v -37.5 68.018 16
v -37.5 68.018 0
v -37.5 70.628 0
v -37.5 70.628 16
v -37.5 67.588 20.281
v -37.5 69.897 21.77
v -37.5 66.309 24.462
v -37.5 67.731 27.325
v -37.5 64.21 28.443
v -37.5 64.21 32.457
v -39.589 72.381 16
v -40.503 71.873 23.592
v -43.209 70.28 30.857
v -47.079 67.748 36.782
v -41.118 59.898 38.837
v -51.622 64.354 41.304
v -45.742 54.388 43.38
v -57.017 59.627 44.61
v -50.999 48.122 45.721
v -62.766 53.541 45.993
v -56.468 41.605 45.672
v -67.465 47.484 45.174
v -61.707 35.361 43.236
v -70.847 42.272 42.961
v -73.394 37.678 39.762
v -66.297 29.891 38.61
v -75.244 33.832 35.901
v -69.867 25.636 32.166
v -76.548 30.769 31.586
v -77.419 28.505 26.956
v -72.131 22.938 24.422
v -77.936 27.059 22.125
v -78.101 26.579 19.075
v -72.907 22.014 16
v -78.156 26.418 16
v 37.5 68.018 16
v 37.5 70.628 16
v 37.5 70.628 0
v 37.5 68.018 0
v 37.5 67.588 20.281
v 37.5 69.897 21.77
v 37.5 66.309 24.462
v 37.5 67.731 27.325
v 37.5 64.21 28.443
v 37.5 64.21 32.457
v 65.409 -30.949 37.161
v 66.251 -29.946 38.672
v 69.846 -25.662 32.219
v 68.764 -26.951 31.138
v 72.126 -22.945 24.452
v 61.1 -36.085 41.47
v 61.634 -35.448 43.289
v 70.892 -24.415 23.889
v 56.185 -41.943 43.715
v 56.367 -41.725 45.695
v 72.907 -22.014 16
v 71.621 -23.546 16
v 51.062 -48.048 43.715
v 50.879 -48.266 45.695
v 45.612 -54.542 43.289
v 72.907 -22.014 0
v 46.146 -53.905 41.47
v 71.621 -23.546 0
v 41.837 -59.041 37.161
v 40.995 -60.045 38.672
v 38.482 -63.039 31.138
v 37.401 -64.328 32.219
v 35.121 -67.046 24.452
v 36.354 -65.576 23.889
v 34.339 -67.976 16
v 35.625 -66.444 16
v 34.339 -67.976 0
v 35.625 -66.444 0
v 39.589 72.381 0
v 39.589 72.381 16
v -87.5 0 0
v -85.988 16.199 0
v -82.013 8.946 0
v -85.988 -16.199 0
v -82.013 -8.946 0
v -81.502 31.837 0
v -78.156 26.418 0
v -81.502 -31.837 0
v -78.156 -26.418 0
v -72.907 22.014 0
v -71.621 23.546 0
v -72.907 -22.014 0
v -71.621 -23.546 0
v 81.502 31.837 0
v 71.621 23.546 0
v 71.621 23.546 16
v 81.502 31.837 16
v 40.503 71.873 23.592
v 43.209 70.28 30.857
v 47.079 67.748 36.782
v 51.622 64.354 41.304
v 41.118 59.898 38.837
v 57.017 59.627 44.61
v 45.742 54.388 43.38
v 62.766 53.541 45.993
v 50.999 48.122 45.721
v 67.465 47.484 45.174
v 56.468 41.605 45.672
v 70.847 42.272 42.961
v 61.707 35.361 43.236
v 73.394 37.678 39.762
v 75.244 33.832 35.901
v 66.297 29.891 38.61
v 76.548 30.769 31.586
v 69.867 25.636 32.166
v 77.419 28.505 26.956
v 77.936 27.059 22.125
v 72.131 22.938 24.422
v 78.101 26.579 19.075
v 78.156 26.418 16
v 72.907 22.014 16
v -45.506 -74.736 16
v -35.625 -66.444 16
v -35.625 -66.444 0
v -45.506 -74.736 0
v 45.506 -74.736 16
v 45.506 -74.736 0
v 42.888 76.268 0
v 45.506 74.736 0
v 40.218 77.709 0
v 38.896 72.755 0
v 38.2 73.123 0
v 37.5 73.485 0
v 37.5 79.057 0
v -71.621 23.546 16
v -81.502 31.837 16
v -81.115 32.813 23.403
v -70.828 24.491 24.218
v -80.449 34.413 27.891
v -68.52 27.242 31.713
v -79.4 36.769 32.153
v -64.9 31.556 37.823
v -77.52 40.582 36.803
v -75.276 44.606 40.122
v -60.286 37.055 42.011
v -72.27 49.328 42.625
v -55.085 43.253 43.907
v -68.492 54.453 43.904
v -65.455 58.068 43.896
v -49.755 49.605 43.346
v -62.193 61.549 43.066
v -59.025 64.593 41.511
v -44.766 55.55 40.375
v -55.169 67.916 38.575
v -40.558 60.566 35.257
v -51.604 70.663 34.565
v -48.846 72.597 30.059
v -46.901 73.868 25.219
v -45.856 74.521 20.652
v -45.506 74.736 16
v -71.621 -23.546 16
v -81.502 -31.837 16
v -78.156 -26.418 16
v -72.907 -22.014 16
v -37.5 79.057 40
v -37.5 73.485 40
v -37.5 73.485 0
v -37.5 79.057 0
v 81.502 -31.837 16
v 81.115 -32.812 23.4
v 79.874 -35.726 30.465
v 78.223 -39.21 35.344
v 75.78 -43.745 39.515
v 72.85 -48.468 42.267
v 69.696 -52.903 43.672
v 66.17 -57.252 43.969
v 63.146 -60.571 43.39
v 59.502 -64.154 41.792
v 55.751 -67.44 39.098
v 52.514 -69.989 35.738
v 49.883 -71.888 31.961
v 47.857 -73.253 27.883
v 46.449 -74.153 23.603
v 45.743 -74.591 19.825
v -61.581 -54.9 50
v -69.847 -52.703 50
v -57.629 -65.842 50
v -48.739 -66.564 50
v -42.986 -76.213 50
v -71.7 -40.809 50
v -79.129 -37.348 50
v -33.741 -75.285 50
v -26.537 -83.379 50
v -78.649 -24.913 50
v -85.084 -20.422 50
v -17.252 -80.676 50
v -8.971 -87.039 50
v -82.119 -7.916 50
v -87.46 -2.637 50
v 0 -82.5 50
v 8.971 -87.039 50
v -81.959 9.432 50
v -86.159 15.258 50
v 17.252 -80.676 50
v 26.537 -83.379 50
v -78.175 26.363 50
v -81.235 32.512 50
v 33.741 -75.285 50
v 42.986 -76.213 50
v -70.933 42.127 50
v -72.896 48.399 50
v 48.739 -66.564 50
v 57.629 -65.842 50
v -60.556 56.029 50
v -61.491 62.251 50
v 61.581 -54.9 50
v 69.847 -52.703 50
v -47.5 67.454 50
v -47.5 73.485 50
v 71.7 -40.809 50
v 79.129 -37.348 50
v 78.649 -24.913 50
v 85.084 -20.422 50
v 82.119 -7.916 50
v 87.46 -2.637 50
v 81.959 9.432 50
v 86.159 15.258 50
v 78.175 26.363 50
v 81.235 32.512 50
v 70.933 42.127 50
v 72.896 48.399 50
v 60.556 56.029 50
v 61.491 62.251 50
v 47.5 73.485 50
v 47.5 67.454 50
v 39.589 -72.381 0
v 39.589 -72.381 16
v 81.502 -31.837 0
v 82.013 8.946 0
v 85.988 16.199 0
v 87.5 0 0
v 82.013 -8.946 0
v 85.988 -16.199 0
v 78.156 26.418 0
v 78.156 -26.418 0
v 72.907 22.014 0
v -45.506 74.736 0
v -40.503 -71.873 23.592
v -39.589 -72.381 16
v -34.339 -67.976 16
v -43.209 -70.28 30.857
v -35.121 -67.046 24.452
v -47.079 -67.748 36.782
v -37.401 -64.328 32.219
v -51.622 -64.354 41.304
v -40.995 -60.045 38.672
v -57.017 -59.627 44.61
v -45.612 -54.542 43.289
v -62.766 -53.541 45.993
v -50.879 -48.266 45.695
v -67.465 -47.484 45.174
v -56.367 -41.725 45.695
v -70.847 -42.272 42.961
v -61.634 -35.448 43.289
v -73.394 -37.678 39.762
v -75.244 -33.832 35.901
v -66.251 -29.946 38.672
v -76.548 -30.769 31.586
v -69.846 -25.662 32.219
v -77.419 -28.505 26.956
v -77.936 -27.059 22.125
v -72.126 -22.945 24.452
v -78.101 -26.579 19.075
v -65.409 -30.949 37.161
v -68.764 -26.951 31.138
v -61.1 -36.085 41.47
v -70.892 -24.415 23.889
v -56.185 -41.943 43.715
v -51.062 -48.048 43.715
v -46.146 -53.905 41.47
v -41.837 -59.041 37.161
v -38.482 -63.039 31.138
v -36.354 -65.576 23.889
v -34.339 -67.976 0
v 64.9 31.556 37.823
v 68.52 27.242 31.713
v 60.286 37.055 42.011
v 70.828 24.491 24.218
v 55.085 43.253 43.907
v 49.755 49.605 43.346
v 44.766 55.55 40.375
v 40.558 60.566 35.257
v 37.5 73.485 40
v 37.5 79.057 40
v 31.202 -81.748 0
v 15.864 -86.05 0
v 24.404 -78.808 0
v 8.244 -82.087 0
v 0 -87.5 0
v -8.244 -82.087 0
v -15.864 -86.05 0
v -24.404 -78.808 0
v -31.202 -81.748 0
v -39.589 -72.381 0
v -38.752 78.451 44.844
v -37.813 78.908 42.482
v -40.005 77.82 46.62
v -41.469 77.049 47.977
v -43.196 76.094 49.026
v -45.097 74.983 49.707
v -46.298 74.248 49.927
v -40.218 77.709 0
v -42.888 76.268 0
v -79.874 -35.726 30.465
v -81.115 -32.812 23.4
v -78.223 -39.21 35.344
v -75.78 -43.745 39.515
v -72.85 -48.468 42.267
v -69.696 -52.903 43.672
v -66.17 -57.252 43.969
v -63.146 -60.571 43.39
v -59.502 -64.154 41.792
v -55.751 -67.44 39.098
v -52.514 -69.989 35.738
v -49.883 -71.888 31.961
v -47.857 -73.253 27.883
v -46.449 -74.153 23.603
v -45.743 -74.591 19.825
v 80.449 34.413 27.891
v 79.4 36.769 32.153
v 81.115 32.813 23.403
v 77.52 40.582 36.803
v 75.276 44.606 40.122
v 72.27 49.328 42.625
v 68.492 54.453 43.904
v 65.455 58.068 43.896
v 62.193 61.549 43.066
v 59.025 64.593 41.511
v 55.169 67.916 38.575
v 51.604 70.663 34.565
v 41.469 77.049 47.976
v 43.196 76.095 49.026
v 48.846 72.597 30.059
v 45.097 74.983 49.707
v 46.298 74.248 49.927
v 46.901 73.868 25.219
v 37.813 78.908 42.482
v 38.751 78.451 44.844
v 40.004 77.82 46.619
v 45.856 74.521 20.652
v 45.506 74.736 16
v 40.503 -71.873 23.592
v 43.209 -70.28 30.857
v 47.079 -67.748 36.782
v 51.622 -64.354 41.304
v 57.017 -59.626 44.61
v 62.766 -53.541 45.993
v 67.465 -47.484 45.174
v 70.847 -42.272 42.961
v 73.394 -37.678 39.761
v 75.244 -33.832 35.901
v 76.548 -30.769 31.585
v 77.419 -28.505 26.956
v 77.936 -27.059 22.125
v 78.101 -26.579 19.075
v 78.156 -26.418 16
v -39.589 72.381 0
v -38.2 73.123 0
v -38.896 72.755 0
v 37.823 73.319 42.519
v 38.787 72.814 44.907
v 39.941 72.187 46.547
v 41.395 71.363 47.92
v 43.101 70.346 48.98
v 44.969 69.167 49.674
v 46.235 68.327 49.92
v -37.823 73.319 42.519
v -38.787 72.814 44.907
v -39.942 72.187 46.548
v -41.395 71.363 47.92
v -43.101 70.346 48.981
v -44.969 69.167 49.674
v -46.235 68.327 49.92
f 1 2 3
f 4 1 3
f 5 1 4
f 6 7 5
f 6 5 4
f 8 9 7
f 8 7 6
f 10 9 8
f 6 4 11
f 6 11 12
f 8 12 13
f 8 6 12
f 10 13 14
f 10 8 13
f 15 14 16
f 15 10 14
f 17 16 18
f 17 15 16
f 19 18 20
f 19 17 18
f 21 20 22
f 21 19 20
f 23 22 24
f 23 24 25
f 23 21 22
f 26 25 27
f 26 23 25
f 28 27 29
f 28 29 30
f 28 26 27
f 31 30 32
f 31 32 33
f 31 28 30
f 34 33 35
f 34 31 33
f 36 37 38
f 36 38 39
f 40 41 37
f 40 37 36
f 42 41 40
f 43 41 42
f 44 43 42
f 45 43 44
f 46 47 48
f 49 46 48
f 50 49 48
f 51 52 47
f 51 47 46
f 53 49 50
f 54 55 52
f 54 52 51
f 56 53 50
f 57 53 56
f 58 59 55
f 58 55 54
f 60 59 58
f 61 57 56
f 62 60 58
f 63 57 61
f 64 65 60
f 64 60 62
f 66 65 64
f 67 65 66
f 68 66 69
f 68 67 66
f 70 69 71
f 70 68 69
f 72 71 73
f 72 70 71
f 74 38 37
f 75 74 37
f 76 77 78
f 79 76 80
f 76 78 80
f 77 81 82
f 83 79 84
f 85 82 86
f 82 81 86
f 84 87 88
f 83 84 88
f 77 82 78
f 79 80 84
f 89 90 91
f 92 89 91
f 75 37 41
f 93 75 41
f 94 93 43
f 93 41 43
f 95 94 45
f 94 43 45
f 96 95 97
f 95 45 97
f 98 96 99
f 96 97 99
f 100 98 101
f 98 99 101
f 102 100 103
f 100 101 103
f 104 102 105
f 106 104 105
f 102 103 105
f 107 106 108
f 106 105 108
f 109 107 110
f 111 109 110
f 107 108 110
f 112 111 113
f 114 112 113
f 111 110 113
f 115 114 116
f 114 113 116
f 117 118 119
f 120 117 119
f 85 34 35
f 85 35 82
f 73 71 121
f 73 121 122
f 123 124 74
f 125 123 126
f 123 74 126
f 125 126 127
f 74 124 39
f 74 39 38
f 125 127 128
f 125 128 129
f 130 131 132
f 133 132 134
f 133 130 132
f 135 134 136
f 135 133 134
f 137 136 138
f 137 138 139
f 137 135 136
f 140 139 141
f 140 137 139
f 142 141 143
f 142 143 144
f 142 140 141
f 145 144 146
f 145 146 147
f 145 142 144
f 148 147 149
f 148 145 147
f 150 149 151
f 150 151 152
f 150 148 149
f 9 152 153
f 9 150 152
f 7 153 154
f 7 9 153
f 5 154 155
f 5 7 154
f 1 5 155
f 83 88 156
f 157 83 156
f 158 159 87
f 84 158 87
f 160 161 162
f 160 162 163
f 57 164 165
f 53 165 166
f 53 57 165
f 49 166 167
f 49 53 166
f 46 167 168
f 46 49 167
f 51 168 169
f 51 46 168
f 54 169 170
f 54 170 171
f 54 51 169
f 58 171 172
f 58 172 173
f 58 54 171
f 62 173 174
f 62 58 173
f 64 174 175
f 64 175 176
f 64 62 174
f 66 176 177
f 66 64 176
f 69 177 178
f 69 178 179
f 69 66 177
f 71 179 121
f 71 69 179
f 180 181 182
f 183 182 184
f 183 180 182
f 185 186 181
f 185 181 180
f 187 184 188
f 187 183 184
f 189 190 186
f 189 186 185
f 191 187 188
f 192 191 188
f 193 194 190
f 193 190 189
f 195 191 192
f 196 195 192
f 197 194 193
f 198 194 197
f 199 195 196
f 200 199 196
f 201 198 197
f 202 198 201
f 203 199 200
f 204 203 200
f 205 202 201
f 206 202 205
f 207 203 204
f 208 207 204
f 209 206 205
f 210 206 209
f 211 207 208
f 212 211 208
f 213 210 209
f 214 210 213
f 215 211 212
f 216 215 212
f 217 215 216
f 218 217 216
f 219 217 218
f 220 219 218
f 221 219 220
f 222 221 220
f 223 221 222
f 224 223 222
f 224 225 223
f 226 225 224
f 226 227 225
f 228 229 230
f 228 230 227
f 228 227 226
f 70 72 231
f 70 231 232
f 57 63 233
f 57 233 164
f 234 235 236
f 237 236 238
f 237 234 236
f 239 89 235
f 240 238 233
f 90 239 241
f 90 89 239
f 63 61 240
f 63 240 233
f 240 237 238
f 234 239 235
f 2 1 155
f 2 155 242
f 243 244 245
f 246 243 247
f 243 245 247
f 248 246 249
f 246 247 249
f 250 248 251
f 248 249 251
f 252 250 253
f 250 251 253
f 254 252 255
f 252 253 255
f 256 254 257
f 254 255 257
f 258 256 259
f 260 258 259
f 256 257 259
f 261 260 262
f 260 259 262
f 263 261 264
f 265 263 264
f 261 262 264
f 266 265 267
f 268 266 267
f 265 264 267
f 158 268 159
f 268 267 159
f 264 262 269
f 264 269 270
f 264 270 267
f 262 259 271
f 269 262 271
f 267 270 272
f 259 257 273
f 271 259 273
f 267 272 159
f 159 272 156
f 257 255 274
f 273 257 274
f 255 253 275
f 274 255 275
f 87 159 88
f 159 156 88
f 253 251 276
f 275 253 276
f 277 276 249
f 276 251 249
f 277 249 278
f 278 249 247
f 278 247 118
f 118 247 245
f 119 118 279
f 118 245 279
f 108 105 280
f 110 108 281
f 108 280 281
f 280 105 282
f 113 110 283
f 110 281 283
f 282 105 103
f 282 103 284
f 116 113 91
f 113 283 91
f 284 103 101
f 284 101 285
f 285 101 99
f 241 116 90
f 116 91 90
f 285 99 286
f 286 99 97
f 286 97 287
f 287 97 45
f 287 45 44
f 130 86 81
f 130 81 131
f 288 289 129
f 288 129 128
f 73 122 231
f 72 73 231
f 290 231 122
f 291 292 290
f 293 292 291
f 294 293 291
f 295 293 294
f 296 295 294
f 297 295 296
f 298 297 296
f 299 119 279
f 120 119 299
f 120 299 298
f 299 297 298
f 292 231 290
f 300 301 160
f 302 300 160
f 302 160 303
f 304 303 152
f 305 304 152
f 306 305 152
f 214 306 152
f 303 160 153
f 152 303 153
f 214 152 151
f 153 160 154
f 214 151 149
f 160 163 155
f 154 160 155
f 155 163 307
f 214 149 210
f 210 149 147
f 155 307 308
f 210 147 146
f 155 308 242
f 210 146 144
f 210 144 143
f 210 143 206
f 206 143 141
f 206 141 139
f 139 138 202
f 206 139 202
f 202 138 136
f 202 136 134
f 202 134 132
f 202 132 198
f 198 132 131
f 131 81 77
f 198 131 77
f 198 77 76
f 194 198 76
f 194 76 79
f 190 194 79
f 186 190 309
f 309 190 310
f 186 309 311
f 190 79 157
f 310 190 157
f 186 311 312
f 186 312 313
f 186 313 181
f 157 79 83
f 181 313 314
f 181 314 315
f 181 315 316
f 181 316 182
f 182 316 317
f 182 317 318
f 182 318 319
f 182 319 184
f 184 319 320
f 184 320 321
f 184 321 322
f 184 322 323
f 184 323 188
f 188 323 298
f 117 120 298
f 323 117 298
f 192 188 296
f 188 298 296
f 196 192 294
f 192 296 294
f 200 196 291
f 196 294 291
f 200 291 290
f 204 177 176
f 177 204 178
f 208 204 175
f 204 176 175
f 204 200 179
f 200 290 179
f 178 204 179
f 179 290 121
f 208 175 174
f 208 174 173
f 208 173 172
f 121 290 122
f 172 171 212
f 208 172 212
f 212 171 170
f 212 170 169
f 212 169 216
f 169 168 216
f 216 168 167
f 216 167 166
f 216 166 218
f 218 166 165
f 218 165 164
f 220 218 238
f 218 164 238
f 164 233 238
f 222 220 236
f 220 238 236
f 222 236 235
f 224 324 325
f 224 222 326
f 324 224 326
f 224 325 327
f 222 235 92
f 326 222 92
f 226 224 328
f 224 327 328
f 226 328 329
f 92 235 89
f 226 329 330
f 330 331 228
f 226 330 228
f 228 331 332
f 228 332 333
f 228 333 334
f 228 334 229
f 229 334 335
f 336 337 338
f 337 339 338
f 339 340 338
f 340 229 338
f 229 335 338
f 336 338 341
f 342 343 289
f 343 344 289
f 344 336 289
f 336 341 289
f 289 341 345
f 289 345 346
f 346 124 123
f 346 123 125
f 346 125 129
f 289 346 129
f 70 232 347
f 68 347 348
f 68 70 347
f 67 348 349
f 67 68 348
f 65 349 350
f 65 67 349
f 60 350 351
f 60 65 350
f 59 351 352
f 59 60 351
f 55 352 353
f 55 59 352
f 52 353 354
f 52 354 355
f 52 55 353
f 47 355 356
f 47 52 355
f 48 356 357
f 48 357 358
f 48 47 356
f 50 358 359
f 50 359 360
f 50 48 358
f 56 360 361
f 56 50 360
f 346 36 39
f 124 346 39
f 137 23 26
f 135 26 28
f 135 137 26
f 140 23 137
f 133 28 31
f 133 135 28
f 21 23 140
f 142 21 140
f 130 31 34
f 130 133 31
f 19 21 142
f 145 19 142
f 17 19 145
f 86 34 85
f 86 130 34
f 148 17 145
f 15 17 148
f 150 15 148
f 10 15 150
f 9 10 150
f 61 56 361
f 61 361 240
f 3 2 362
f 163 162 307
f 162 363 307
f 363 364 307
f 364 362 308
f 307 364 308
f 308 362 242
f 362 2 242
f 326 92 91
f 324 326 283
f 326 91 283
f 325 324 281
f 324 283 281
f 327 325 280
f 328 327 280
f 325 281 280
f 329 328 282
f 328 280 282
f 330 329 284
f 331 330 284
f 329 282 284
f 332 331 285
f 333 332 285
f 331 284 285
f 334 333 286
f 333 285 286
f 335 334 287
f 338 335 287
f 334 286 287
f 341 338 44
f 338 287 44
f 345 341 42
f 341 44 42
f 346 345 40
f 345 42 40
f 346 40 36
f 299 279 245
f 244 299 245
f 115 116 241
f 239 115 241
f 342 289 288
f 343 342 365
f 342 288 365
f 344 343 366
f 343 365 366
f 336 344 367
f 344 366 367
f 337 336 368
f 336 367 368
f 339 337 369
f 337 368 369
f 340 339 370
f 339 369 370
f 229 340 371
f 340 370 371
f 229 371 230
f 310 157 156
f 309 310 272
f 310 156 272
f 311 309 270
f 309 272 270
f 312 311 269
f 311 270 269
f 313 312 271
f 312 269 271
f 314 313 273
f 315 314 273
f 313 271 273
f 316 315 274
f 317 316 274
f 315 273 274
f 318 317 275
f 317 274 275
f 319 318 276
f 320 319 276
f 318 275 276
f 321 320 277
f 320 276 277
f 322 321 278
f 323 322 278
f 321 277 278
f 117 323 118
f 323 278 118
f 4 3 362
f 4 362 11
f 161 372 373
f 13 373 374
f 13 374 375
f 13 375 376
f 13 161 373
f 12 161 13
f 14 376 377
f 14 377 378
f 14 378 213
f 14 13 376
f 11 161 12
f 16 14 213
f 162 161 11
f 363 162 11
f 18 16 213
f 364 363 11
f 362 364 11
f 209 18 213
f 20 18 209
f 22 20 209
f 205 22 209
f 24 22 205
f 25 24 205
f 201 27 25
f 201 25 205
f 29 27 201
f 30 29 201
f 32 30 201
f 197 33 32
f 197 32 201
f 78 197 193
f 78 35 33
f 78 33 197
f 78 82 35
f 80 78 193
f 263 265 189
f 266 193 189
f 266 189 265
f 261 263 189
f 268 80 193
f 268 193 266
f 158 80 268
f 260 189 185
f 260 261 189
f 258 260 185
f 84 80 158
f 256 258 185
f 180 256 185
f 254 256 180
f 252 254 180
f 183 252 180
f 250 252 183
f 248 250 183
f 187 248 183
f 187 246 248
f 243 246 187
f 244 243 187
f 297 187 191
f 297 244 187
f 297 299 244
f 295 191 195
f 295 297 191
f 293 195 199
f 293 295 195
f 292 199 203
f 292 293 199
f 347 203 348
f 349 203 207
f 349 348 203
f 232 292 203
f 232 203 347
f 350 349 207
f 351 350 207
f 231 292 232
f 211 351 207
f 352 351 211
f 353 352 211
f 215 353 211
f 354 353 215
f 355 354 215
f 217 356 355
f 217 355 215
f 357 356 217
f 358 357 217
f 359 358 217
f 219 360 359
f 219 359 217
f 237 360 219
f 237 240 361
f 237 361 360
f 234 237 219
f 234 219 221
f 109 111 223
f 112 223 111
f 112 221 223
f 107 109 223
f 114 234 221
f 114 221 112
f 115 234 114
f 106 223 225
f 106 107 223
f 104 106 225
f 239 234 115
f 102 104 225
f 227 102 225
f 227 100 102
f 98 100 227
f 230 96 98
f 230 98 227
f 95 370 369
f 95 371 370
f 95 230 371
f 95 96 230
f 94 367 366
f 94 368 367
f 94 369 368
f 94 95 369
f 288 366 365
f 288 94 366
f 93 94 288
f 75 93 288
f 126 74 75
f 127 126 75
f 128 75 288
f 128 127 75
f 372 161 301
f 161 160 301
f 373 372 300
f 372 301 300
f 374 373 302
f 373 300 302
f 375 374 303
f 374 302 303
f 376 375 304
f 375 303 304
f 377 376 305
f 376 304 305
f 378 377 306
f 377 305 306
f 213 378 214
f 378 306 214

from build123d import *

# Parameters (mm, degrees)
SKETCH1_R                                     = 87.5
SKETCH1_R_2                                   = 82.49999999999999
BOSS_EXTRUDE1_DEPTH                           = 50
CUT_EXTRUDE1_DEPTH                            = 134.46347815039138
BOSS_EXTRUDE2_REACH                           = 201.927
BOSS_EXTRUDE2_END_RADIUS                      = 82.49999999999999
MIRROR1_AT_THE_SECOND_PLANE_COPY_1_DEPTH      = 134.46347815039138
MIRROR1_AT_THE_SECOND_PLANE_COPY_2_REACH      = 201.927
MIRROR1_AT_THE_SECOND_PLANE_COPY_2_END_RADIUS = 82.49999999999999
CUT_EXTRUDE2_DEPTH                            = 134.46347831897683
FILLET1_R                                     = 10.000000000000002


with BuildPart() as part:
    # Sketch1 → Boss-Extrude1 (new body)
    with BuildSketch(Plane.XY):
        Circle(SKETCH1_R)
        Circle(SKETCH1_R_2, mode=Mode.SUBTRACT)
    extrude(amount=BOSS_EXTRUDE1_DEPTH)

    # Sketch3 → Cut-Extrude1 (cut, through all)
    with BuildSketch(Plane(origin=(0, 0, 0), x_dir=(0, 0, 1), z_dir=(-0.7660444431189792, 0.6427876096865379, 0))):
        with BuildLine():
            Line((16, 28), (-21.31588633738815, 28))
            Line((-21.31588633738815, 28), (-21.31588633738815, -28))
            Line((-21.31588633738815, -28), (16, -28))
            ThreePointArc((16, -28), (44, 0), (16, 28))
        make_face()
    cut_extrude1 = extrude(amount=CUT_EXTRUDE1_DEPTH, mode=Mode.SUBTRACT)

    # Boss-Extrude2: up to this cylinder (the profile starts inside it)
    boss_extrude2_end = Plane(origin=(0, 0, 8), z_dir=(0, 0, -1)) * Cylinder(BOSS_EXTRUDE2_END_RADIUS, 569.8539999999999, mode=Mode.PRIVATE)
    # Sketch5 → Boss-Extrude2 (add, up to the surface)
    with BuildSketch(Plane(origin=(-53.623111018328544, 44.995132678057665, 0), x_dir=(0, 0, 1), z_dir=(-0.7660444431189792, 0.6427876096865379, 0)), mode=Mode.PRIVATE) as boss_extrude2_sk1:
        with BuildLine():
            Line((0, -28.000000000000014), (16, -28.000000000000014))
            ThreePointArc((16, -28.000000000000014), (44, -1.388e-14), (16, 27.99999999999998))
            Line((16, 27.99999999999998), (0, 27.99999999999998))
            Line((0, 27.99999999999998), (-3.7e-16, 29.99999999999998))
            Line((-3.7e-16, 29.99999999999998), (16.000000000000007, 29.999999999999982))
            ThreePointArc((16.000000000000007, 29.999999999999982), (46, -1.388e-14), (16, -30.000000000000014))
            Line((16, -30.000000000000014), (1.2e-16, -30.000000000000014))
            Line((1.2e-16, -30.000000000000014), (0, -28.000000000000014))
        make_face()
    boss_extrude2_tool1 = extrude(boss_extrude2_sk1.sketch, amount=BOSS_EXTRUDE2_REACH, mode=Mode.PRIVATE) & boss_extrude2_end
    boss_extrude2 = boss_extrude2_tool1.solids().sort_by_distance((-72.420765, 22.592961, 8))[0]
    add(boss_extrude2)

    # Mirror1: Cut-Extrude1, Boss-Extrude2 across plane
    add(cut_extrude1.mirror(Plane(origin=(0, 0, 0), x_dir=(0, 0, 1), z_dir=(1, 0, 0))), mode=Mode.SUBTRACT)
    add(boss_extrude2.mirror(Plane(origin=(0, 0, 0), x_dir=(0, 0, 1), z_dir=(1, 0, 0))))

    # Mirror1 at the second plane: Cut-Extrude1, Boss-Extrude2 across plane
    add(cut_extrude1.mirror(Plane.ZX), mode=Mode.SUBTRACT)
    add(boss_extrude2.mirror(Plane.ZX))

    # Mirror1 at the second plane copy 1 sketc → Mirror1 at the second plane copy 1 (cut, through all)
    with BuildSketch(Plane(origin=(0, 0, 0), x_dir=(0, 0, 1), z_dir=(0.7660444431189792, -0.6427876096865379, 0))):
        with BuildLine():
            Line((16, 28), (-21.31588633738815, 28))
            Line((-21.31588633738815, 28), (-21.31588633738815, -28))
            Line((-21.31588633738815, -28), (16, -28))
            ThreePointArc((16, -28), (44, 0), (16, 28))
        make_face()
    extrude(amount=MIRROR1_AT_THE_SECOND_PLANE_COPY_1_DEPTH, mode=Mode.SUBTRACT)

    # Mirror1 at the second plane copy 2: up to this cylinder (the profile starts inside it)
    mirror1_at_the_second_plane_copy_2_end = Plane(origin=(0, 0, 8), z_dir=(0, 0, -1)) * Cylinder(MIRROR1_AT_THE_SECOND_PLANE_COPY_2_END_RADIUS, 569.8539999999999, mode=Mode.PRIVATE)
    # Mirror1 at the second plane copy 2 sketc → Mirror1 at the second plane copy 2 (add, up to the surface)
    with BuildSketch(Plane(origin=(53.623111018328544, -44.995132678057665, 0), x_dir=(0, 0, 1), z_dir=(0.7660444431189792, -0.6427876096865379, 0)), mode=Mode.PRIVATE) as mirror1_at_the_second_plane_copy_2_sk1:
        with BuildLine():
            Line((0, -28.000000000000014), (16, -28.000000000000014))
            ThreePointArc((16, -28.000000000000014), (44, -1.388e-14), (16, 27.99999999999998))
            Line((16, 27.99999999999998), (0, 27.99999999999998))
            Line((0, 27.99999999999998), (-3.7e-16, 29.99999999999998))
            Line((-3.7e-16, 29.99999999999998), (16.000000000000007, 29.999999999999982))
            ThreePointArc((16.000000000000007, 29.999999999999982), (46, -1.388e-14), (16, -30.000000000000014))
            Line((16, -30.000000000000014), (1.2e-16, -30.000000000000014))
            Line((1.2e-16, -30.000000000000014), (0, -28.000000000000014))
        make_face()
    mirror1_at_the_second_plane_copy_2_tool1 = extrude(mirror1_at_the_second_plane_copy_2_sk1.sketch, amount=MIRROR1_AT_THE_SECOND_PLANE_COPY_2_REACH, mode=Mode.PRIVATE) & mirror1_at_the_second_plane_copy_2_end
    add(mirror1_at_the_second_plane_copy_2_tool1.solids().sort_by_distance((-72.420765, 22.592961, 8))[0])

    # Sketch4 → Cut-Extrude2 (cut, through all)
    with BuildSketch(Plane.XY.offset(50)):
        Polygon((-37.5, 150.50625054825755), (37.5, 150.50625054825755), (37.49999999999998, 0), (-37.49999999999998, 0), align=None)
    extrude(amount=-CUT_EXTRUDE2_DEPTH, mode=Mode.SUBTRACT)

    # Fillet1
    fillet1_edges = [part.edges().sort_by_distance(p)[0] for p in [
        (37.49999999999999, 76.2708168938525, 50),
        (-37.49999999999999, 76.2708168938529, 50),
    ]]
    fillet(fillet1_edges, radius=FILLET1_R)


solid = part.part
